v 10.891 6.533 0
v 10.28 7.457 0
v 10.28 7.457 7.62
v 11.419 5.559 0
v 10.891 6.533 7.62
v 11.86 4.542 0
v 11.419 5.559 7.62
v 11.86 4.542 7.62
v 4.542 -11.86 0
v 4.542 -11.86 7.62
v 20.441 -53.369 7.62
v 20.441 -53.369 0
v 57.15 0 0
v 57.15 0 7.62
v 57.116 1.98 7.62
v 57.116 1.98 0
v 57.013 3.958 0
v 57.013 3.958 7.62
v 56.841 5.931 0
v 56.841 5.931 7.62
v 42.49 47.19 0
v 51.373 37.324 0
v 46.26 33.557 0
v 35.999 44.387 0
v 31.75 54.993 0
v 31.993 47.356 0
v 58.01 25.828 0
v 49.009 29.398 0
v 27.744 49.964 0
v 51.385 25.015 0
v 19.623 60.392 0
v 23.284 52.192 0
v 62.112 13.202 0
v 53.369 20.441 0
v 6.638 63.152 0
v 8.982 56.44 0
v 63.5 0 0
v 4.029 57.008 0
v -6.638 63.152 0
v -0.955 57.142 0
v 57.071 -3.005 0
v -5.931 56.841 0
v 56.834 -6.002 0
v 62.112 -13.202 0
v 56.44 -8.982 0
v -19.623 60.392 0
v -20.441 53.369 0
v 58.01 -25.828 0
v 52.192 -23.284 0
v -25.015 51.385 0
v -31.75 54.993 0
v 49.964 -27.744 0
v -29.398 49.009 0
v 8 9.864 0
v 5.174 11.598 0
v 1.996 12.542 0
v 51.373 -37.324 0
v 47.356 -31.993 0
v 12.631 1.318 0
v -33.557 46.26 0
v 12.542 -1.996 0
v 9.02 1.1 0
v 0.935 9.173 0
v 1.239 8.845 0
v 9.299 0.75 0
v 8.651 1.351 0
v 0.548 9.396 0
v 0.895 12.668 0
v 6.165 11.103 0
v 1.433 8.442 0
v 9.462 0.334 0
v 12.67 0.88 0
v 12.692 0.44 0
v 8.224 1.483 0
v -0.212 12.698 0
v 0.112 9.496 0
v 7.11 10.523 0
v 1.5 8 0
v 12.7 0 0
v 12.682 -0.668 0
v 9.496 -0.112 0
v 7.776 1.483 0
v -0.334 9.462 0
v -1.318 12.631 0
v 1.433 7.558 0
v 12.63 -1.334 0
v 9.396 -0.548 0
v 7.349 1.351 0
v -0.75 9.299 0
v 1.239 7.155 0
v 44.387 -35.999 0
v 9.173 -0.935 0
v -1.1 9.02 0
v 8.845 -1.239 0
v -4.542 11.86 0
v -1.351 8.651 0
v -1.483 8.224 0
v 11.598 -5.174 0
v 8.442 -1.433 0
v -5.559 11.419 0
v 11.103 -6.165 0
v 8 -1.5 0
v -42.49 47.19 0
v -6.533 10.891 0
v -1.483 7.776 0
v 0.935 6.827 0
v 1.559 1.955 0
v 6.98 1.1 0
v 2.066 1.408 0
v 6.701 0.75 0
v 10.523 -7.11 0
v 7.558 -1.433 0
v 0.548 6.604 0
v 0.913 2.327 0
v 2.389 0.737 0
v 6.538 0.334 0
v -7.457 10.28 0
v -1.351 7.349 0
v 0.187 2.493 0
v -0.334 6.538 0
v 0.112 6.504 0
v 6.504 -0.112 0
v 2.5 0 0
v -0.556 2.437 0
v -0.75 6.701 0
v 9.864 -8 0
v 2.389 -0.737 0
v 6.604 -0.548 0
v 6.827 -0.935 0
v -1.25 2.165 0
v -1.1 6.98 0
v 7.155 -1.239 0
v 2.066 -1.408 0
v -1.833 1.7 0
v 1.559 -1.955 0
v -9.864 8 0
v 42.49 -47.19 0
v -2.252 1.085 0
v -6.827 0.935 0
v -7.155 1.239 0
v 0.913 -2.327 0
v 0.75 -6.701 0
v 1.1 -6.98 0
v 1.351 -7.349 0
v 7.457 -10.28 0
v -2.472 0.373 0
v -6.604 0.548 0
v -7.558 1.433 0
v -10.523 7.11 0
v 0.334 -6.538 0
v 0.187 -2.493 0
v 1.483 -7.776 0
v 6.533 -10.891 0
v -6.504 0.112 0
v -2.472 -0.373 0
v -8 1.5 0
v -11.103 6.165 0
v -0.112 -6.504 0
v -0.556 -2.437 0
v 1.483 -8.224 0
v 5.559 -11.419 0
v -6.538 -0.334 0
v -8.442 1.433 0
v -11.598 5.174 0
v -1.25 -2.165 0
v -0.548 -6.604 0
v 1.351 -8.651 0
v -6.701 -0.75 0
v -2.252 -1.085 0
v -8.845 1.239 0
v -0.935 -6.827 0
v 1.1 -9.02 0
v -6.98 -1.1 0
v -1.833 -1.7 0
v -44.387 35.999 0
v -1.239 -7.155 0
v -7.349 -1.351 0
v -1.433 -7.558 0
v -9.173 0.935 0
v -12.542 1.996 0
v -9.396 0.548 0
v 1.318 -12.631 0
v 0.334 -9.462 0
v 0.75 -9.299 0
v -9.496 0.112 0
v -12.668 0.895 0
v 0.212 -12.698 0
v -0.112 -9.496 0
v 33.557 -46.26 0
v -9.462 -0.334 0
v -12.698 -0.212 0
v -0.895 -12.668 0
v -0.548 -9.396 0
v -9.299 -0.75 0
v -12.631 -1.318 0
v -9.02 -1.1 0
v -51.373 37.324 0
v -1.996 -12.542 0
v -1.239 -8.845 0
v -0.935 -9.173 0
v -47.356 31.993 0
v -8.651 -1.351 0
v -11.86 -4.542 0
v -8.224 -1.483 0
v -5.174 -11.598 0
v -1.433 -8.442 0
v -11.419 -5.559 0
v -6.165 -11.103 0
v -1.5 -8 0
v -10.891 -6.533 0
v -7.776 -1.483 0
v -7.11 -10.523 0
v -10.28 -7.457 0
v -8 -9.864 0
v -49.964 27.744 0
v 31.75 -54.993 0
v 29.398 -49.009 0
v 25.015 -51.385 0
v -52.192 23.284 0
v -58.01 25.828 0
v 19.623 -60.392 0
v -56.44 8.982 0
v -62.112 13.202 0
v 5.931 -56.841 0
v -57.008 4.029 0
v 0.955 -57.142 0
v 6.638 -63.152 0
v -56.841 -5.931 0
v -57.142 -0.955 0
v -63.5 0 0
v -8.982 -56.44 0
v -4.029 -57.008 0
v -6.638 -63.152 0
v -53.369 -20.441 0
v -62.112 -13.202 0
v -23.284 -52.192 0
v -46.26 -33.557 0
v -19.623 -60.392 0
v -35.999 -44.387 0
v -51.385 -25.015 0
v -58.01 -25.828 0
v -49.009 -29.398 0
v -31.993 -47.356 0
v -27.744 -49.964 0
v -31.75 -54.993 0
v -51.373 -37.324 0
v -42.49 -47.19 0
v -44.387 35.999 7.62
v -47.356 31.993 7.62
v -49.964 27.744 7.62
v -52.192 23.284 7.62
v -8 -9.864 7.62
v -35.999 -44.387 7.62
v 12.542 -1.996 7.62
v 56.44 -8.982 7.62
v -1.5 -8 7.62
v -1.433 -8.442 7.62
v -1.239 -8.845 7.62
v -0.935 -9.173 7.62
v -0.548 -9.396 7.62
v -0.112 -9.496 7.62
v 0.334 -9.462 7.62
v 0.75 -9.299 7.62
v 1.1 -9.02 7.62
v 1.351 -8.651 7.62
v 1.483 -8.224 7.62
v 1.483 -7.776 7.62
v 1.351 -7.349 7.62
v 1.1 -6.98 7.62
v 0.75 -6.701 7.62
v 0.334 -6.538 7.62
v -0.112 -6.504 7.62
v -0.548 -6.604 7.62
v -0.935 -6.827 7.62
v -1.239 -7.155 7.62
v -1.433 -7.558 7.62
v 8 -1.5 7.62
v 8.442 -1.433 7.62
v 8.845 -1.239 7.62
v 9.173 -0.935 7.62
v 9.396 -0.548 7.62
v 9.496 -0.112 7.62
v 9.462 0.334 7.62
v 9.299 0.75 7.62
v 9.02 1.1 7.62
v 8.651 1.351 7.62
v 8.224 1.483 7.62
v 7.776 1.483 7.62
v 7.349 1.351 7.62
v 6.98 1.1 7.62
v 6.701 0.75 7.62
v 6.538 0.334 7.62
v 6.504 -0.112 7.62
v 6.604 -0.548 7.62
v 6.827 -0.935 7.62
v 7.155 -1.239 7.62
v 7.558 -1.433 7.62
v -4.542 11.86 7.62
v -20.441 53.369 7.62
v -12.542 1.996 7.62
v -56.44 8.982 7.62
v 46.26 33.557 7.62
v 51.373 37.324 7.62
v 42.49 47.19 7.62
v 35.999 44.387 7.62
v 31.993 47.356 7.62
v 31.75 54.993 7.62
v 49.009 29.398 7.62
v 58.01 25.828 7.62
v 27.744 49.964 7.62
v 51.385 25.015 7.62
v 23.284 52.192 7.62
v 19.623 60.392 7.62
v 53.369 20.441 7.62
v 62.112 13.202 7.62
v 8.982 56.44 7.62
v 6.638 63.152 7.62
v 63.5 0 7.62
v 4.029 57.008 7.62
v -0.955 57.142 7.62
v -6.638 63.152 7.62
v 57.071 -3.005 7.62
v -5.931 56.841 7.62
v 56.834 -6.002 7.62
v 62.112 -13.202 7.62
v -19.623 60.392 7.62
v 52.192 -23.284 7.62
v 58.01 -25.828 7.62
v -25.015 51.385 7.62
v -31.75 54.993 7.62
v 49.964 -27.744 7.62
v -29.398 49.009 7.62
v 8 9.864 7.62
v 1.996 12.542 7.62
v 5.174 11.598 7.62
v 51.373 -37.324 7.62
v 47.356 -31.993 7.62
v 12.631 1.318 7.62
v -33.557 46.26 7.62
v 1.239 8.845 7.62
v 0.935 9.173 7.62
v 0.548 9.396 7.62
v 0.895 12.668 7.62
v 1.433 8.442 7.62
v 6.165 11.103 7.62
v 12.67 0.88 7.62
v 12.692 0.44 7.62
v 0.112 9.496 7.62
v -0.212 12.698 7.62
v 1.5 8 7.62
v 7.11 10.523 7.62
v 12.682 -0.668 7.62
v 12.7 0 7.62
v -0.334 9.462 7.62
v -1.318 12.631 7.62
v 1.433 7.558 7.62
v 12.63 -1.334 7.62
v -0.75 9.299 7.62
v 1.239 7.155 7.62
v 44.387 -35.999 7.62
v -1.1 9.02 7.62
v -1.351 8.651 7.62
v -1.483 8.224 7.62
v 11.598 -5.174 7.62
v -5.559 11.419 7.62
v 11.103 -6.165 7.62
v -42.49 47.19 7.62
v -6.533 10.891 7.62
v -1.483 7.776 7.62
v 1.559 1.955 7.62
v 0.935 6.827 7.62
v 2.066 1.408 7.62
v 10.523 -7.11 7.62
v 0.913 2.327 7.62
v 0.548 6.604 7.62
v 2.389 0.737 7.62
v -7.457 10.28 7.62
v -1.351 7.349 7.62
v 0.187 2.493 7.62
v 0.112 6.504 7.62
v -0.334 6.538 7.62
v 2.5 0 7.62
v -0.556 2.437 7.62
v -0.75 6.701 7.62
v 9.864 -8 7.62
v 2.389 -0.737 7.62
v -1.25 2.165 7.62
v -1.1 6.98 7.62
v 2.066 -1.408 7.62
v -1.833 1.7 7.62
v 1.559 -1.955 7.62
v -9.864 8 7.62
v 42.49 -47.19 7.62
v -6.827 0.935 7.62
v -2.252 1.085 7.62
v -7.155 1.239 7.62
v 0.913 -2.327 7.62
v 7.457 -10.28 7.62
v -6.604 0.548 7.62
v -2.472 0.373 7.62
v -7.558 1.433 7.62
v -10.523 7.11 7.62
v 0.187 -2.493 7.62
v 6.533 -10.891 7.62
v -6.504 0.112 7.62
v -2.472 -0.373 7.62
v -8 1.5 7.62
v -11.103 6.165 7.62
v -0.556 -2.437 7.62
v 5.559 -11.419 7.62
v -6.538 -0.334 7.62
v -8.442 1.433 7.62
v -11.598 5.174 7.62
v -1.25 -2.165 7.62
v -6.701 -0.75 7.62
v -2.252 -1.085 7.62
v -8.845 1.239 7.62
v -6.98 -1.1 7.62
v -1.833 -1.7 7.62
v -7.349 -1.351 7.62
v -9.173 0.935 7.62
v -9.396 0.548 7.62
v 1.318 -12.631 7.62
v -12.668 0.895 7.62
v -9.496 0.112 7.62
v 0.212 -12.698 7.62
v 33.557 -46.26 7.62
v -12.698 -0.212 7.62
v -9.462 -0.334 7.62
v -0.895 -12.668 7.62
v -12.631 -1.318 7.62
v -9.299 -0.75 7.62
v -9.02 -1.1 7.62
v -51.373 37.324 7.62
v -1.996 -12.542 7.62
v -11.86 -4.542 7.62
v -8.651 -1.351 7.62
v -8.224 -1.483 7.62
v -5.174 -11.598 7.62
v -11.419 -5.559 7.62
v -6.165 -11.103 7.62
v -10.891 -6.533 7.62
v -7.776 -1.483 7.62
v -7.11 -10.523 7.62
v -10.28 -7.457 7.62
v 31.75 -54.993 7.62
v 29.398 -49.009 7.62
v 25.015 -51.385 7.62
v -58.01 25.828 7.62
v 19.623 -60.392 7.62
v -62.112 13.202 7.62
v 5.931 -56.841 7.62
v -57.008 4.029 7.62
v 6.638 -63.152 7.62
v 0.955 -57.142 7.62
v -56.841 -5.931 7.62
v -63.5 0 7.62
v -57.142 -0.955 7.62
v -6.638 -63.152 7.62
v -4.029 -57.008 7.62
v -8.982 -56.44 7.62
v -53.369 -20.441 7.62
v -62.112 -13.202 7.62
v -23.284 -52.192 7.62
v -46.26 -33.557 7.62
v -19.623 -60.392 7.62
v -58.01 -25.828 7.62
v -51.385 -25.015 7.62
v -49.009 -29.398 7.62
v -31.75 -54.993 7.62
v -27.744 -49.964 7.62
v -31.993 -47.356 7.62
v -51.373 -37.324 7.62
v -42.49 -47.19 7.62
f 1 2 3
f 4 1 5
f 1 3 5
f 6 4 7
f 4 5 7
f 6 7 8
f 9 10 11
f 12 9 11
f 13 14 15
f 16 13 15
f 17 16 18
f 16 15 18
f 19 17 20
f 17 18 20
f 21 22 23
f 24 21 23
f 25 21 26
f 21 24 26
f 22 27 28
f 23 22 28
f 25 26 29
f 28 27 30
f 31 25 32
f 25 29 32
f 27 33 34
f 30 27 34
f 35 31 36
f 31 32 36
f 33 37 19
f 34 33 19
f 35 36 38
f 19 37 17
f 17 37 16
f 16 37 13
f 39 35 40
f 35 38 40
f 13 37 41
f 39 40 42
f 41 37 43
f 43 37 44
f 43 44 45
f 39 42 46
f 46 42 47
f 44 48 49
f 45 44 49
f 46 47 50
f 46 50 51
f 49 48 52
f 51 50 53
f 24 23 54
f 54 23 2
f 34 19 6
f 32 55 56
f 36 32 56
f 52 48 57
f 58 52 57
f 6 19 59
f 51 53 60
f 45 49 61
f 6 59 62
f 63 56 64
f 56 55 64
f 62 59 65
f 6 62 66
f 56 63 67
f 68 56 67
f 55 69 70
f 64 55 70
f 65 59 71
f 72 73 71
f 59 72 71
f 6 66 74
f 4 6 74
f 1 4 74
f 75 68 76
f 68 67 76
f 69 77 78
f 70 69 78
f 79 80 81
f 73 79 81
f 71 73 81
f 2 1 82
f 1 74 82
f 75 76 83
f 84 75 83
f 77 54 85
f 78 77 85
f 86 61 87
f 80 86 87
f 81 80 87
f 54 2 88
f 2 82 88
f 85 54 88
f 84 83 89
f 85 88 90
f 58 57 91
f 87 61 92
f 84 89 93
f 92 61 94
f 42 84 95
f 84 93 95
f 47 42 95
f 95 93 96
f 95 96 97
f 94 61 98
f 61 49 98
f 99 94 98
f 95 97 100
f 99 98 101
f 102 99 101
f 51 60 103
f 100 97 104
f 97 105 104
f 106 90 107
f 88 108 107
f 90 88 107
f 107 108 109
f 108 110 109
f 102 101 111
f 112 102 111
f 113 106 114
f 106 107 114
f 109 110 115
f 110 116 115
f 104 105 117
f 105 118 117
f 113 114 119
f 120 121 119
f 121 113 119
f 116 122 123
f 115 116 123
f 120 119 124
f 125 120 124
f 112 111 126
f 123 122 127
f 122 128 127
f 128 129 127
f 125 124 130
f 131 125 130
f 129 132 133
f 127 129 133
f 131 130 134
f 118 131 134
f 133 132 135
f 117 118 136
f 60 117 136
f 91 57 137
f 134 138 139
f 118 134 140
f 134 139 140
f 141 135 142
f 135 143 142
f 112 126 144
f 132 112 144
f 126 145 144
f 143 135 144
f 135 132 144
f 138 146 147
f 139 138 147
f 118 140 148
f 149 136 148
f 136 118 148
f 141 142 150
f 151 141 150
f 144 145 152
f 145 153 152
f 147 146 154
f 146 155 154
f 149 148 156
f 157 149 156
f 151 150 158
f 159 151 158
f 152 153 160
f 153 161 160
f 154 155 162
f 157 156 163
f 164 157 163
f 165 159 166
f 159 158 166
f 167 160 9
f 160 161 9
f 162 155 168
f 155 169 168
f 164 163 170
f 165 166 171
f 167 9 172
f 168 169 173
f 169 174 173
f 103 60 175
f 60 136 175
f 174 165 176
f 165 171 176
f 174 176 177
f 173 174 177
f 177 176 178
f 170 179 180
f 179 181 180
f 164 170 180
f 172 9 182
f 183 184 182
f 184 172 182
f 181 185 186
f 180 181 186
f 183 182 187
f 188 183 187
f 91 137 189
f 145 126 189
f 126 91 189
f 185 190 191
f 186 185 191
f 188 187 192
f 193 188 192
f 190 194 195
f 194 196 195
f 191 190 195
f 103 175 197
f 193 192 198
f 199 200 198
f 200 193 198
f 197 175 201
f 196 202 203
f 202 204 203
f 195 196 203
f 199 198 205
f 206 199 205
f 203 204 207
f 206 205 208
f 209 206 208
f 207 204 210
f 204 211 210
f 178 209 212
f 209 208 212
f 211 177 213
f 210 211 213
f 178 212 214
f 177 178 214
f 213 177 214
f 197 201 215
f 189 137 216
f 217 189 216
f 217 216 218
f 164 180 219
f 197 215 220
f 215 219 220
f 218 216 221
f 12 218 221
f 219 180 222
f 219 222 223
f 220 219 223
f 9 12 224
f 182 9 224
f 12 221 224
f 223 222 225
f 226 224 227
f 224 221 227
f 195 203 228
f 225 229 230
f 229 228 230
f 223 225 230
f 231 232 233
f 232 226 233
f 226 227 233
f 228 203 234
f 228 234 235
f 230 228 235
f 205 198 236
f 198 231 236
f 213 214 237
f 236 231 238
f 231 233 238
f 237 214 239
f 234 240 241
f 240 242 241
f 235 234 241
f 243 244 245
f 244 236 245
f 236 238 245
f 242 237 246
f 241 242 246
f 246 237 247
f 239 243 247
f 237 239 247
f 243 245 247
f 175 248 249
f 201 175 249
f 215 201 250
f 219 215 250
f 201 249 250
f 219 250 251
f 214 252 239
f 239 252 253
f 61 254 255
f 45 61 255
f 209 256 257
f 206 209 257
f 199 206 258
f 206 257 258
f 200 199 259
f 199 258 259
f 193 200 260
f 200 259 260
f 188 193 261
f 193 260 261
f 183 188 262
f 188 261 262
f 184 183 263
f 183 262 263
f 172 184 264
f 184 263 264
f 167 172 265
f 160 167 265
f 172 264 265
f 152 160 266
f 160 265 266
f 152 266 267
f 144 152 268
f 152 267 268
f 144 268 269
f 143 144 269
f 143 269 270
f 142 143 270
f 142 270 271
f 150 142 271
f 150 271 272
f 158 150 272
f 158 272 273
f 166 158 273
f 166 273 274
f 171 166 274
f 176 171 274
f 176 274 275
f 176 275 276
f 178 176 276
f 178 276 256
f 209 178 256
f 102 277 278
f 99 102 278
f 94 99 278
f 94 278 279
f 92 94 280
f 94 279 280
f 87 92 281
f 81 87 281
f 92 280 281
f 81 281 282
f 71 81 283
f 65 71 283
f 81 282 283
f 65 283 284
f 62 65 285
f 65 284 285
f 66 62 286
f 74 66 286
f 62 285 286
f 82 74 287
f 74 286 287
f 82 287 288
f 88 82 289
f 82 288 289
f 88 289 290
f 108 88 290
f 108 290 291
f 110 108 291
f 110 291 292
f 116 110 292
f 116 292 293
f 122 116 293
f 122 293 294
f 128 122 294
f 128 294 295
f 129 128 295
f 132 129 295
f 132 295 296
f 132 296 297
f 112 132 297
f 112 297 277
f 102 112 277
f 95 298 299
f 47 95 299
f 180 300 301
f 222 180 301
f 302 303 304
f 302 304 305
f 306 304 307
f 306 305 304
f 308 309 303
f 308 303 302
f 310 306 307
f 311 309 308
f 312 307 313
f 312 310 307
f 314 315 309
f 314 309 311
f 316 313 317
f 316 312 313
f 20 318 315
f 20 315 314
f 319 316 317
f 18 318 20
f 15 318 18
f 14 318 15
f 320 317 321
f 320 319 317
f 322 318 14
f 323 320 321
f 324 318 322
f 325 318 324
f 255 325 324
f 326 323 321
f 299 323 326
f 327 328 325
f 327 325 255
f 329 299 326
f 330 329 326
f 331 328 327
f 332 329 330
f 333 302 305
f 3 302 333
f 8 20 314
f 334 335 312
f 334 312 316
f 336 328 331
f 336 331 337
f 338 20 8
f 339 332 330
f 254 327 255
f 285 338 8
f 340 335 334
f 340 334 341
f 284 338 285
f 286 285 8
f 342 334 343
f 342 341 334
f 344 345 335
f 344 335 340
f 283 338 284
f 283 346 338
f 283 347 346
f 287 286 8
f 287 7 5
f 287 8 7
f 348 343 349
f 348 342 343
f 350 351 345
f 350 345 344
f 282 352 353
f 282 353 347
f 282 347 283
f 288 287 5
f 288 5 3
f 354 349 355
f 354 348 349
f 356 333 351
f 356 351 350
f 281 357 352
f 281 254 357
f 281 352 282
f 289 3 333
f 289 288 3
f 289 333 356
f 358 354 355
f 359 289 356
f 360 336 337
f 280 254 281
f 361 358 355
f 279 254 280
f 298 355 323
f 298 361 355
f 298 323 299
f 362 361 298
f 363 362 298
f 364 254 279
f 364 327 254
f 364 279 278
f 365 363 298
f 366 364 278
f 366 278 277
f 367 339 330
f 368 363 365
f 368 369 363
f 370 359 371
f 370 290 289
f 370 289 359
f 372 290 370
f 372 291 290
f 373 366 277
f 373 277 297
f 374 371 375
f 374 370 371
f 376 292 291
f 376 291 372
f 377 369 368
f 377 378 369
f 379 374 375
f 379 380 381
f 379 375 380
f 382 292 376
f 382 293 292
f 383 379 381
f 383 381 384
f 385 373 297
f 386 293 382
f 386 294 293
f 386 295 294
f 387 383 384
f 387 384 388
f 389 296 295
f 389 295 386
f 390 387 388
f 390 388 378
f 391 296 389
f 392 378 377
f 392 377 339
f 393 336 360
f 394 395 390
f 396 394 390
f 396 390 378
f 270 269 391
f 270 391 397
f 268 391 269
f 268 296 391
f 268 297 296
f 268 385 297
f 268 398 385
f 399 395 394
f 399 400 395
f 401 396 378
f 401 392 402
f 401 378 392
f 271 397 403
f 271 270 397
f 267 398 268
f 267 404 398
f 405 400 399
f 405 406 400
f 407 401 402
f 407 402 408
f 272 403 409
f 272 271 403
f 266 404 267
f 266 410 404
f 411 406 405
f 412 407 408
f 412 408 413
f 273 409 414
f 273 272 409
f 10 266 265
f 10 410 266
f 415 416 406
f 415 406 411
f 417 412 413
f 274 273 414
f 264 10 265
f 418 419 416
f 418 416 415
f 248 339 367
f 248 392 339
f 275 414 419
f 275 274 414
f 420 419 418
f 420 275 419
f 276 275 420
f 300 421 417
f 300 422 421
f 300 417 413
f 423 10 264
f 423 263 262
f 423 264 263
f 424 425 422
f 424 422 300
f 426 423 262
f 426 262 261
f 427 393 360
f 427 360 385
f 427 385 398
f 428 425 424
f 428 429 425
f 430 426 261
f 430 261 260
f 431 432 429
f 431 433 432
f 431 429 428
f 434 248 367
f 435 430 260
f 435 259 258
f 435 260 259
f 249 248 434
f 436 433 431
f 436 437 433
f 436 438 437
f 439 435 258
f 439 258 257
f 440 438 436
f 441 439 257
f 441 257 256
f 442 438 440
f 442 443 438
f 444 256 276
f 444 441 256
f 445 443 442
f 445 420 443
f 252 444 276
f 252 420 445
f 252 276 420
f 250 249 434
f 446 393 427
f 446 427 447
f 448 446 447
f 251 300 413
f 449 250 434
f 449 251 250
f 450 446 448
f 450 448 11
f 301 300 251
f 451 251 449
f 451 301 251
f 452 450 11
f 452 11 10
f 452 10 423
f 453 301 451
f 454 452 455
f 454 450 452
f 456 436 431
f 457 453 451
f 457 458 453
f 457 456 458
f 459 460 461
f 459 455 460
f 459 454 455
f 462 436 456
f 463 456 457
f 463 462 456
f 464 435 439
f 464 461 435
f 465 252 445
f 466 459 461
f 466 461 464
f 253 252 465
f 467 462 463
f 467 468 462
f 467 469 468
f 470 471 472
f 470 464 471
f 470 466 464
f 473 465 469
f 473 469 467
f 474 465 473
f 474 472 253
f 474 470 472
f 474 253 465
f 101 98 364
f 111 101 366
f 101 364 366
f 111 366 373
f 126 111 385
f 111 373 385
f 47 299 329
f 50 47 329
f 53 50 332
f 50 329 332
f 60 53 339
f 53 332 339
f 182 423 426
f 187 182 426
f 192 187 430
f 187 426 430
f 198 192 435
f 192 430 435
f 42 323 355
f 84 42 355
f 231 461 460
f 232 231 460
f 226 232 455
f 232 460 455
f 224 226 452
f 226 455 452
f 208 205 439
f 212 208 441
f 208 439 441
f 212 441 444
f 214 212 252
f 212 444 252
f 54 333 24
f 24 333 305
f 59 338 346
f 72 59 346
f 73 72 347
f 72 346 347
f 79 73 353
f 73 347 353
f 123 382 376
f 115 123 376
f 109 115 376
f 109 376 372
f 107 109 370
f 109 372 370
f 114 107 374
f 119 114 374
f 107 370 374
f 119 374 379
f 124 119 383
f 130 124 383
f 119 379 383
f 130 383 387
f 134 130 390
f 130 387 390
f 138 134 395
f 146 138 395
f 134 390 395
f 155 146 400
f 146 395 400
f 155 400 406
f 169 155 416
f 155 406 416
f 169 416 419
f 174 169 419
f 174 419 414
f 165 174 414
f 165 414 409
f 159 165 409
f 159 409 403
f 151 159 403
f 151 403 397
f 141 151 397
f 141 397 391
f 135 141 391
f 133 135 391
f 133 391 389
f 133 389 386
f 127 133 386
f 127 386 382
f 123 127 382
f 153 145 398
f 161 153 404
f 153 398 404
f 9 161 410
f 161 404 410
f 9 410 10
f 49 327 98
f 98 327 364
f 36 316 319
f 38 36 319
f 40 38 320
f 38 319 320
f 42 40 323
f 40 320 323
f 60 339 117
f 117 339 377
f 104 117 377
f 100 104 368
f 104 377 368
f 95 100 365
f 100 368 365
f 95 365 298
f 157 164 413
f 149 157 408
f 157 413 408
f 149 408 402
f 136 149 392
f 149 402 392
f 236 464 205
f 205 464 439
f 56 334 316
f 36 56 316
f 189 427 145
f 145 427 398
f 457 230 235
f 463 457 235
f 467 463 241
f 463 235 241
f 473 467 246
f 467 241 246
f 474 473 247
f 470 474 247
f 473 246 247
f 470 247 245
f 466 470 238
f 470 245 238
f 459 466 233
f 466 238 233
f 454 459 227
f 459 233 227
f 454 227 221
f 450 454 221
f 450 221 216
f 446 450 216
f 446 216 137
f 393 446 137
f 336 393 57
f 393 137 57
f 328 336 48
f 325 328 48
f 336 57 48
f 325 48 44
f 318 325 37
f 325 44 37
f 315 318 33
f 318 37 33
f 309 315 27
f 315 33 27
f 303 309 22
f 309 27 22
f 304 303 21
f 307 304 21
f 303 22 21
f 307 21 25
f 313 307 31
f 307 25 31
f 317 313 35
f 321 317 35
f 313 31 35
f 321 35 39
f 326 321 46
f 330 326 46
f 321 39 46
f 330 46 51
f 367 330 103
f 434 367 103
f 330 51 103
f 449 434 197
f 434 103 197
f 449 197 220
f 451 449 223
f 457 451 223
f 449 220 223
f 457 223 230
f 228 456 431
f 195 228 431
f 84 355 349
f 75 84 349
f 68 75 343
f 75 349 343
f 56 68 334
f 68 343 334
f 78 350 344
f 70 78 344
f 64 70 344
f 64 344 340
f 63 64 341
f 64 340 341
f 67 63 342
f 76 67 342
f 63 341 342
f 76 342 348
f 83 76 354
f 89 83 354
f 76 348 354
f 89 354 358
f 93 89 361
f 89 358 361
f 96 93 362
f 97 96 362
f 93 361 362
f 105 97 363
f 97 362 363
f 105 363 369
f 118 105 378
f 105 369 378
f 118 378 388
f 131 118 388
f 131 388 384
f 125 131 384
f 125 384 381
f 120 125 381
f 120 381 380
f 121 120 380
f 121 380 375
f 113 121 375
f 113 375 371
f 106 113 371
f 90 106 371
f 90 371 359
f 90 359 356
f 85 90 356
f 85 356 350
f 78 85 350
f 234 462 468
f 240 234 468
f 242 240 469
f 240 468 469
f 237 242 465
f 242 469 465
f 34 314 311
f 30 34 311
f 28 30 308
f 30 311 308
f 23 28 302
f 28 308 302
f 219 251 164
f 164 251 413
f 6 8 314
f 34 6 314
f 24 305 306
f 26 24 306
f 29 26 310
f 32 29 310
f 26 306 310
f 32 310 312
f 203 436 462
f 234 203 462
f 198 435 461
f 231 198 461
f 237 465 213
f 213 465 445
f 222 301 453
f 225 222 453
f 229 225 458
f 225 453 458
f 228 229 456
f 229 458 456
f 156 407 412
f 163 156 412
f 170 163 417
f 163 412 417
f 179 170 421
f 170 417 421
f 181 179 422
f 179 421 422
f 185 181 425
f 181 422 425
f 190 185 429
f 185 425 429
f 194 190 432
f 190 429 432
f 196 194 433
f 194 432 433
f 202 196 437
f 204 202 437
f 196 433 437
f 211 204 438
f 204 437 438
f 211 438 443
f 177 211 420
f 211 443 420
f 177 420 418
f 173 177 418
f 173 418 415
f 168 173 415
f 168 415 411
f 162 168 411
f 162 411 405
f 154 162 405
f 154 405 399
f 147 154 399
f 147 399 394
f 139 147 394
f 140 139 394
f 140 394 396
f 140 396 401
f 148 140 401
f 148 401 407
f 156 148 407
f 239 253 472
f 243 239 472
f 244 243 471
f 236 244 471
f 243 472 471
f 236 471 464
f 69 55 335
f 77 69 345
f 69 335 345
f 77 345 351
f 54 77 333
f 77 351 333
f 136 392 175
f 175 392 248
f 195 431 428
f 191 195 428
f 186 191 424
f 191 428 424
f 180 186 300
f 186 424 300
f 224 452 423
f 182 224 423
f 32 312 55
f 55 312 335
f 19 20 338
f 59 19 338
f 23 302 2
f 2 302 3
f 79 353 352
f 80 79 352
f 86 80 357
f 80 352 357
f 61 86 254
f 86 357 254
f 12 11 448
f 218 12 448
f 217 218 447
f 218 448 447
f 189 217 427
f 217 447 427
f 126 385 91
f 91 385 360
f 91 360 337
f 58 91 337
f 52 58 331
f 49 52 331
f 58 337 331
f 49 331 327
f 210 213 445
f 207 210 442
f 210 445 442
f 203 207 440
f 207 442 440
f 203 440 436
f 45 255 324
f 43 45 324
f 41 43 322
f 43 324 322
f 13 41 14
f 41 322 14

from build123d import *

# Parameters (mm, degrees)
SKETCH2_R           = 63.5
BOSS_EXTRUDE1_DEPTH = 7.62
CUT_EXTRUDE3_DEPTH  = 91.125270596
SKETCH6_R           = 1.5
CUT_EXTRUDE6_DEPTH  = 91.125270596
CIRPATTERN1_COUNT   = 4
SKETCH7_R           = 2.5
CUT_EXTRUDE5_DEPTH  = 91.125270596


with BuildPart() as part:
    # Sketch2 → Boss-Extrude1 (new body)
    with BuildSketch(Plane.XY):
        with Locations(Location((0, 0, 0), (0, 0, 180))):
            Circle(SKETCH2_R)
    extrude(amount=BOSS_EXTRUDE1_DEPTH)

    # Sketch5 → Cut-Extrude3 (cut, through all)
    with BuildSketch(Plane.XY.offset(7.62)):
        with BuildLine():
            ThreePointArc((-1.318093472, 12.631414394), (0.341913424, 12.695396615), (1.996070086, 12.54215708))
            Line((1.996070086, 12.54215708), (8.982315386, 56.439706859))
            ThreePointArc((8.982315386, 56.439706859), (1.538610407, 57.129284767), (-5.931420623, 56.841364774))
            Line((-5.931420623, 56.841364774), (-1.318093472, 12.631414394))
        make_face()
        with BuildLine():
            Line((23.283921447, 52.191776192), (5.174204766, 11.598172487))
            ThreePointArc((5.174204766, 11.598172487), (6.643804018, 10.823579268), (7.999725942, 9.863791606))
            Line((7.999725942, 9.863791606), (35.998766739, 44.387062229))
            ThreePointArc((35.998766739, 44.387062229), (29.897118082, 48.706106705), (23.283921447, 52.191776192))
        make_face()
        with BuildLine():
            ThreePointArc((10.280079015, 7.457209628), (11.165492692, 6.051592597), (11.859861692, 4.542431138))
            Line((11.859861692, 4.542431138), (53.369377615, 20.44094012))
            ThreePointArc((53.369377615, 20.44094012), (50.244717112, 27.232166685), (46.260355568, 33.557443327))
            Line((46.260355568, 33.557443327), (10.280079015, 7.457209628))
        make_face()
        with BuildLine():
            ThreePointArc((12.7, 0), (12.660477774, -1.00115061), (12.54215708, -1.996070086))
            Line((12.54215708, -1.996070086), (56.439706859, -8.982315386))
            ThreePointArc((56.439706859, -8.982315386), (56.972149981, -4.505177745), (57.15, 0))
            ThreePointArc((57.15, 0), (57.072789037, 2.969722475), (56.841364774, 5.931420623))
            Line((56.841364774, 5.931420623), (12.631414394, 1.318093472))
            ThreePointArc((12.631414394, 1.318093472), (12.682842008, 0.659938328), (12.7, 0))
        make_face()
        with BuildLine():
            ThreePointArc((11.598172487, -5.174204766), (10.823579268, -6.643804018), (9.863791606, -7.999725942))
            Line((9.863791606, -7.999725942), (44.387062229, -35.998766739))
            ThreePointArc((44.387062229, -35.998766739), (48.706106705, -29.897118082), (52.191776192, -23.283921447))
            Line((52.191776192, -23.283921447), (11.598172487, -5.174204766))
        make_face()
        with BuildLine():
            ThreePointArc((7.457209628, -10.280079015), (6.051592597, -11.165492692), (4.542431138, -11.859861692))
            Line((4.542431138, -11.859861692), (20.44094012, -53.369377615))
            ThreePointArc((20.44094012, -53.369377615), (27.232166685, -50.244717112), (33.557443327, -46.260355568))
            Line((33.557443327, -46.260355568), (7.457209628, -10.280079015))
        make_face()
        with BuildLine():
            ThreePointArc((1.318093472, -12.631414394), (-0.341913424, -12.695396615), (-1.996070086, -12.54215708))
            Line((-1.996070086, -12.54215708), (-8.982315386, -56.439706859))
            ThreePointArc((-8.982315386, -56.439706859), (-1.538610407, -57.129284767), (5.931420623, -56.841364774))
            Line((5.931420623, -56.841364774), (1.318093472, -12.631414394))
        make_face()
        with BuildLine():
            ThreePointArc((-5.174204766, -11.598172487), (-6.643804018, -10.823579268), (-7.999725942, -9.863791606))
            Line((-7.999725942, -9.863791606), (-35.998766739, -44.387062229))
            ThreePointArc((-35.998766739, -44.387062229), (-29.897118082, -48.706106705), (-23.283921447, -52.191776192))
            Line((-23.283921447, -52.191776192), (-5.174204766, -11.598172487))
        make_face()
        with BuildLine():
            ThreePointArc((-10.280079015, -7.457209628), (-11.165492692, -6.051592597), (-11.859861692, -4.542431138))
            Line((-11.859861692, -4.542431138), (-53.369377615, -20.44094012))
            ThreePointArc((-53.369377615, -20.44094012), (-50.244717112, -27.232166685), (-46.260355568, -33.557443327))
            Line((-46.260355568, -33.557443327), (-10.280079015, -7.457209628))
        make_face()
        with BuildLine():
            ThreePointArc((-12.631414394, -1.318093472), (-12.695396615, 0.341913424), (-12.54215708, 1.996070086))
            Line((-12.54215708, 1.996070086), (-56.439706859, 8.982315386))
            ThreePointArc((-56.439706859, 8.982315386), (-57.129284767, 1.538610407), (-56.841364774, -5.931420623))
            Line((-56.841364774, -5.931420623), (-12.631414394, -1.318093472))
        make_face()
        with BuildLine():
            ThreePointArc((-11.598172487, 5.174204766), (-10.823579268, 6.643804018), (-9.863791606, 7.999725942))
            Line((-9.863791606, 7.999725942), (-44.387062229, 35.998766739))
            ThreePointArc((-44.387062229, 35.998766739), (-48.706106705, 29.897118082), (-52.191776192, 23.283921447))
            Line((-52.191776192, 23.283921447), (-11.598172487, 5.174204766))
        make_face()
        with BuildLine():
            ThreePointArc((-7.457209628, 10.280079015), (-6.051592597, 11.165492692), (-4.542431138, 11.859861692))
            Line((-4.542431138, 11.859861692), (-20.44094012, 53.369377615))
            ThreePointArc((-20.44094012, 53.369377615), (-27.232166685, 50.244717112), (-33.557443327, 46.260355568))
            Line((-33.557443327, 46.260355568), (-7.457209628, 10.280079015))
        make_face()
    extrude(amount=-CUT_EXTRUDE3_DEPTH, mode=Mode.SUBTRACT)

    # Sketch6 → Cut-Extrude6 (cut, through all)
    with BuildSketch(Plane.XY.offset(7.62)):
        with Locations((0, 8)):
            Circle(SKETCH6_R)
    cut_extrude6 = extrude(amount=-CUT_EXTRUDE6_DEPTH, mode=Mode.SUBTRACT)

    # CirPattern1: Cut-Extrude6 ×4 about axis
    cirpattern1_axis = Axis((0, 0, 0), (0, 0, 1))
    for i in range(1, CIRPATTERN1_COUNT):
        add(cut_extrude6.rotate(cirpattern1_axis, i * 360 / CIRPATTERN1_COUNT), mode=Mode.SUBTRACT)

    # Sketch7 → Cut-Extrude5 (cut, through all)
    with BuildSketch(Plane.XY.offset(7.62)):
        Circle(SKETCH7_R)
    extrude(amount=-CUT_EXTRUDE5_DEPTH, mode=Mode.SUBTRACT)


solid = part.part
